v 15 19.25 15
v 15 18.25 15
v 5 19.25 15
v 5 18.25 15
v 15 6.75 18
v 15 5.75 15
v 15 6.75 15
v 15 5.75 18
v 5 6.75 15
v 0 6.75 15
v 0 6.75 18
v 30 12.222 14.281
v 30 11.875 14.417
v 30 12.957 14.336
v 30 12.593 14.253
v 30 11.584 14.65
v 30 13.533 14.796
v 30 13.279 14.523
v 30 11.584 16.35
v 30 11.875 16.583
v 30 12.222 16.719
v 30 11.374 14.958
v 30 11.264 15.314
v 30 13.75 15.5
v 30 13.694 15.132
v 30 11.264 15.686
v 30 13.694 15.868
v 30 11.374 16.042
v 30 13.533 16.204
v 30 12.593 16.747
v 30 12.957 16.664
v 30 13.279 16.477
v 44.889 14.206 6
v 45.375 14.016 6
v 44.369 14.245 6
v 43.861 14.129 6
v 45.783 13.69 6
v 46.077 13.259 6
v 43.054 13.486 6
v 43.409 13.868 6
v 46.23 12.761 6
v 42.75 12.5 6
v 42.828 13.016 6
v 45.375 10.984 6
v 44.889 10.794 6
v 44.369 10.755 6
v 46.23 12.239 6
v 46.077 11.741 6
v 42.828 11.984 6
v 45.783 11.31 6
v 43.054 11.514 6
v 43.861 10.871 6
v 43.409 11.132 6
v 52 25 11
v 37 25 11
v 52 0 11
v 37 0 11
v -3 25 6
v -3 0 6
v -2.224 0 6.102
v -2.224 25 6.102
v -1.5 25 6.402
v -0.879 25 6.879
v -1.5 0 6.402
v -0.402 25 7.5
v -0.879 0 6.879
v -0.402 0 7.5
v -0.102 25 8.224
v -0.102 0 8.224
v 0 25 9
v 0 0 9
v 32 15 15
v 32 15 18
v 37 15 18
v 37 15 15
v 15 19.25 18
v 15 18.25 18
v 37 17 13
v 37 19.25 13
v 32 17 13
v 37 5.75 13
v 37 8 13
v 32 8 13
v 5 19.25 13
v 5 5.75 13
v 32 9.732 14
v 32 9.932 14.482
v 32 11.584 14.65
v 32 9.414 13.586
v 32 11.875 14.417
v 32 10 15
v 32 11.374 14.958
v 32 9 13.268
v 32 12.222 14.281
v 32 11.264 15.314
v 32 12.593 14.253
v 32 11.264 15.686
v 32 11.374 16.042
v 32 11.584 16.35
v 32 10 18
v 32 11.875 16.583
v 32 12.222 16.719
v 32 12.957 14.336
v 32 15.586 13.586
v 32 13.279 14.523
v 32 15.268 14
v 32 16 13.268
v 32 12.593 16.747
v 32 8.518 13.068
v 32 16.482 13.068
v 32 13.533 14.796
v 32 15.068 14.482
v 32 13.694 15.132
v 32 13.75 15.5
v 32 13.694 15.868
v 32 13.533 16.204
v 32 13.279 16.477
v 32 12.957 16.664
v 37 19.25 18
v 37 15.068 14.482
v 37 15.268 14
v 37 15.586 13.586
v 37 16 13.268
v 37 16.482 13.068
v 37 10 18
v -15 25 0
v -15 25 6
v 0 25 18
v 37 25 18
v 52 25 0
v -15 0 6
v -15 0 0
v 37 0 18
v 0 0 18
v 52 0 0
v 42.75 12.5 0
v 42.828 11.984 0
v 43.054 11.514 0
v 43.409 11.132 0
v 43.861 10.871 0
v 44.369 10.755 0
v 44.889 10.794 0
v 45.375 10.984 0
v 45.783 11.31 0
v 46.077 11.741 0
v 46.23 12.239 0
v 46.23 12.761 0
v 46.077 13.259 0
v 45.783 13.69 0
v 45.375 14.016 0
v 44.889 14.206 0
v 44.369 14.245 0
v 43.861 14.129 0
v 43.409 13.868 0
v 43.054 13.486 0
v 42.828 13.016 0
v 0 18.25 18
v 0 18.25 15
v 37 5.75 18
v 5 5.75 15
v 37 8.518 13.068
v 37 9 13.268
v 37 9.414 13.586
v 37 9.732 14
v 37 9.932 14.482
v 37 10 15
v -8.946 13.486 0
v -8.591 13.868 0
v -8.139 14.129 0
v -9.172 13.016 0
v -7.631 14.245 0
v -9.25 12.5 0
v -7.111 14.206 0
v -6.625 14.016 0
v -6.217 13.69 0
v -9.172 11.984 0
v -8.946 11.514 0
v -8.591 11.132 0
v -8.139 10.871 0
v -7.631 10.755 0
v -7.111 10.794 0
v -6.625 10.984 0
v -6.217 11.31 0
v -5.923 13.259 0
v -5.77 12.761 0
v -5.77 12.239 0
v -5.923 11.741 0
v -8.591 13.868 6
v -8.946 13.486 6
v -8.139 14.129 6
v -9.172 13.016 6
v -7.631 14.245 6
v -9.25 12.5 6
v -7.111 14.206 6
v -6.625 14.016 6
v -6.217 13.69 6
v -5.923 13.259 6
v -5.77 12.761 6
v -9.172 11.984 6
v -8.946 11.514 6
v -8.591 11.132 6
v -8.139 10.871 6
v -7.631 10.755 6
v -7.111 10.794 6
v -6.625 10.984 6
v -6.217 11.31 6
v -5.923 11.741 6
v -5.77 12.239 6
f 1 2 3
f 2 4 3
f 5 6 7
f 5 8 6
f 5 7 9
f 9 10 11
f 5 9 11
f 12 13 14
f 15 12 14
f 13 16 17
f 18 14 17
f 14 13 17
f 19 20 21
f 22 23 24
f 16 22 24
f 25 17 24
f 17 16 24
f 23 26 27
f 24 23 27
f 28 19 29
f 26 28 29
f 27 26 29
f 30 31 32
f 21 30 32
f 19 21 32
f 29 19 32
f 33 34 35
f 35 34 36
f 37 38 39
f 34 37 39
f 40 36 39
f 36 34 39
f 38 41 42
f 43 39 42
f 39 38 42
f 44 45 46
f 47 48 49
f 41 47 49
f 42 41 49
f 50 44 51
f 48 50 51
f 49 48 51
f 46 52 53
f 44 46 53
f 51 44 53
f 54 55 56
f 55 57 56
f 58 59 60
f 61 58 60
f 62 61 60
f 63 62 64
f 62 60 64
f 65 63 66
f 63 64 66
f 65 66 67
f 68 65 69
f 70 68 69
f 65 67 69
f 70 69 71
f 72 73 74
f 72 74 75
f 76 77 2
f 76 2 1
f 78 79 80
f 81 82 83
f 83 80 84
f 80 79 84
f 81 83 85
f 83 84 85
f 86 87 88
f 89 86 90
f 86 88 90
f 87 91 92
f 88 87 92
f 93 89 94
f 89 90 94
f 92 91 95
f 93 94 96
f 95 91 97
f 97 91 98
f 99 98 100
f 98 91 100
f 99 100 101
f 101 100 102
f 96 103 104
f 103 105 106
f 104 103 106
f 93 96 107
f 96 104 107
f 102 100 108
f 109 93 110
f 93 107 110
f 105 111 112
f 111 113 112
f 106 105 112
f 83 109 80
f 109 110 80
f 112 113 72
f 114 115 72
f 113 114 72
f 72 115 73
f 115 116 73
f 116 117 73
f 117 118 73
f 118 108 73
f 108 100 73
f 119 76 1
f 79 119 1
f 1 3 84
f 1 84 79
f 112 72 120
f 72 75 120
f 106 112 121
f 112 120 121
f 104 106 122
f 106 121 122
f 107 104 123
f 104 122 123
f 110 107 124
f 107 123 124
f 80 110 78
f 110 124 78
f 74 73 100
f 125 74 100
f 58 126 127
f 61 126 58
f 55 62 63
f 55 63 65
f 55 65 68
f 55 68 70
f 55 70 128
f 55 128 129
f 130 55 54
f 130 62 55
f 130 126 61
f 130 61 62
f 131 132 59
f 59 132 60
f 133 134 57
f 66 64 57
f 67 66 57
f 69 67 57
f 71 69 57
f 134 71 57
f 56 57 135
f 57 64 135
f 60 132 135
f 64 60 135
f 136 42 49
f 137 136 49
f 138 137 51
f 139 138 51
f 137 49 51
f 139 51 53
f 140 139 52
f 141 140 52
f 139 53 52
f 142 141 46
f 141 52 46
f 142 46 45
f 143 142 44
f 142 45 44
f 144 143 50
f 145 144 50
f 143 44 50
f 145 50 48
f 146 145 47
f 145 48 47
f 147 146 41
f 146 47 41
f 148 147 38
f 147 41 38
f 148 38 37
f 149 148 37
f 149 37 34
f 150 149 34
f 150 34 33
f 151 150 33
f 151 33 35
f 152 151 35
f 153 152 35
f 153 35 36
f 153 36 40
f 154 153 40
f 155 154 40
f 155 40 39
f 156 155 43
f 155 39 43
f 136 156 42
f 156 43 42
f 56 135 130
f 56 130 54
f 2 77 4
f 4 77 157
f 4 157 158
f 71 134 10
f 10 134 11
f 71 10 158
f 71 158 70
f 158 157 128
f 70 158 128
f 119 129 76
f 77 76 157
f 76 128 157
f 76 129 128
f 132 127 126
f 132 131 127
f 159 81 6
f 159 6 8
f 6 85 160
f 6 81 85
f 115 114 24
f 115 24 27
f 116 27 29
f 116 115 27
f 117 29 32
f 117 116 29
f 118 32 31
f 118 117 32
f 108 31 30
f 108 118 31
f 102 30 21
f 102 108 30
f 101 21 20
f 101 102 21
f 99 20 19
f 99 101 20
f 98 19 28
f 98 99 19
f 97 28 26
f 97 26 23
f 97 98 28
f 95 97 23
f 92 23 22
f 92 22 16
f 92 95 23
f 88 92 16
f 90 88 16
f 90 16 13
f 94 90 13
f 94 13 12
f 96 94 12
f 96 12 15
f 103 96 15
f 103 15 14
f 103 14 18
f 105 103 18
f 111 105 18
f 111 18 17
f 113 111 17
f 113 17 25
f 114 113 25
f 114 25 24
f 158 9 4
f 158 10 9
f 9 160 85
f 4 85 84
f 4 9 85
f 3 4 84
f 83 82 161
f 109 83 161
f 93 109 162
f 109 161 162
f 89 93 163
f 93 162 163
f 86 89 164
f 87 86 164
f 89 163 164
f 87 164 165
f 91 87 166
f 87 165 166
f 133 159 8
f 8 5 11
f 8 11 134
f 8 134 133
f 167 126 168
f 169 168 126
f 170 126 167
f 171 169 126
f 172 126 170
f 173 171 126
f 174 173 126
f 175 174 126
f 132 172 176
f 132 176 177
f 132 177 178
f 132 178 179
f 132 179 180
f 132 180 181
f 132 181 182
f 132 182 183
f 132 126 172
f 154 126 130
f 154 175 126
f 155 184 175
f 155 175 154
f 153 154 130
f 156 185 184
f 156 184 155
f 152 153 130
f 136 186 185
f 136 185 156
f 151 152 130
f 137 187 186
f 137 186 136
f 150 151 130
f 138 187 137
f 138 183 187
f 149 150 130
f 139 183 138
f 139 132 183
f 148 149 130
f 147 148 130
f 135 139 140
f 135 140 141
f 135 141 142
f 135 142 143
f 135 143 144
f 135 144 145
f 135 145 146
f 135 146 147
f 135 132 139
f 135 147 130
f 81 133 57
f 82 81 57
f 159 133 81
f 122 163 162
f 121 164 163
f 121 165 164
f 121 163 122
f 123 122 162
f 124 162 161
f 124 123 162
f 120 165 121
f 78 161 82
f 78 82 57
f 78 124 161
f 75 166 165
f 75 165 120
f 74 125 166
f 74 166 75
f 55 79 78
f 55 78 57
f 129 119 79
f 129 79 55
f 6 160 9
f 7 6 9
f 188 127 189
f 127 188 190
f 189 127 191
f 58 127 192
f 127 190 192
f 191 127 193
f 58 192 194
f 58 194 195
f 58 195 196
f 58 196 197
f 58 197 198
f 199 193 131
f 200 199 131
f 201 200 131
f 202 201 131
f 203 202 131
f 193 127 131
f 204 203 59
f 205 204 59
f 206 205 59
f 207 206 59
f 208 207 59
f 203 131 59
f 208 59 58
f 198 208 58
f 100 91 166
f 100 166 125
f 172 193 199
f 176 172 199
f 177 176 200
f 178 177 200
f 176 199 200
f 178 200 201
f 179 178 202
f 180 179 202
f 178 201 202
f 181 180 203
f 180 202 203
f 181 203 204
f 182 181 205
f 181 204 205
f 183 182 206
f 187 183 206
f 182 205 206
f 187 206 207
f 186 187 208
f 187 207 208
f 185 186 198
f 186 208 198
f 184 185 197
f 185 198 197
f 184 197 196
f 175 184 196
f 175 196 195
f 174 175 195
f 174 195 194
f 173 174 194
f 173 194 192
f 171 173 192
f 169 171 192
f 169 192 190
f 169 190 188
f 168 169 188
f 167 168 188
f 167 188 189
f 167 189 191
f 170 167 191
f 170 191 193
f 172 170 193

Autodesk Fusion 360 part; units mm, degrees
sketch "Sketch1" plane through (0, 0, 0) normal (1, 0, 0) x (0, 1, 0)
  line L0 (0, 0) -> (25, 0)
  line L1 (25, 0) -> (25, 18)
  line L2 (0, 18) -> (0, 0)
  line L3 (19.25, 15) -> (19.25, 13)
  line L4 (19.25, 13) -> (5.75, 13)
  line L5 (5.75, 13) -> (5.75, 15)
  line L6 (18.25, 18) -> (18.25, 15)
  line L7 (6.75, 15) -> (6.75, 18)
  line L8 (25, 18) -> (18.25, 18)
  line L9 (6.75, 18) -> (0, 18)
  line L10 (5.75, 15) -> (6.75, 15)
  line L11 (18.25, 15) -> (19.25, 15)
  line L12 (6.75, 15) -> (18.25, 15)
  line L13 (5.75, 13) -> (19.25, 13)
  line L14 (19.25, 13) -> (19.25, 18)
  line L15 (19.25, 18) -> (5.75, 18)
  line L16 (5.75, 18) -> (5.75, 13)
  dimension "d1" = 25
  dimension "d2" = 18
  dimension "d3" = 13.5
  dimension "d4" = 2
  dimension "d5" = 13
  dimension "d6" = 5.75
  dimension "d7" = 1
  dimension "d8" = 11.5
  dimension "d9" = 3
  dimension "d10" = 15
  dimension "d32" = 13.5
sketch "Bokorys" plane through (0, 0, 0) normal (0, 1, 0) x (1, 0, 0)
  line L0 (-15, 0) -> (52, 0)
  line L1 (52, 0) -> (52, -6)
  line L2 (-15, -6) -> (-15, 0)
  line L3 (-15, -6) -> (52, -6)
  dimension "d48" = 15
  dimension "d49" = 67
  dimension "d50" = 6
extrude "Extrude1" add sketch "Sketch1" along normal blind 15 contours L0 L1 L2 L3 L4 L5 L8 L9 L13 L14 L16 | L7 L9 L10 L15 L16 | L6 L8 L11 L14 L15 makes body 1
extrude "Extrude2" add sketch "Sketch1" along normal blind 5 contours L3 L4 L5 L10 L11 L12 L13 L14 L16 bodies 1
extrude "Extrude3" add sketch "Sketch1" along normal blind 25 contours L0 L1 L2 L3 L4 L5 L8 L9 L13 L14 L16 bodies 1
extrude "Extrude4" add 1 faces at (25, 10.25, 4.3333) along direction (1, 0, 0) blind 2 on bodies 1 bodies 1
sketch "Sketch4" plane through (27, 0, 0) normal (1, 0, 0) x (0, 1, 0)
  line L0 (0, 18) -> (0, 0)
  line L1 (0, 0) -> (25, 0)
  line L2 (25, 0) -> (25, 18)
  line L3 (25, 18) -> (19.25, 18)
  line L4 (19.25, 18) -> (19.25, 13)
  line L5 (19.25, 13) -> (5.75, 13)
  line L6 (5.75, 13) -> (5.75, 18)
  line L7 (5.75, 18) -> (0, 18)
  line L8 (0, 0) -> (25, 0)
  line L9 (25, 0) -> (25, 18)
  line L10 (25, 18) -> (0, 18)
  line L11 (0, 18) -> (0, 0)
  circle A0 centre (12.5, 15.5) radius 1.25
  line L12 (10, 18) -> (15, 18)
  line L13 (15, 18) -> (15, 13)
  line L14 (15, 13) -> (10, 13)
  line L15 (10, 13) -> (10, 18)
  dimension "d39" = 2.5
  dimension "d40" = 2.5
  dimension "d41" = 25
  dimension "d42" = 12.5
  dimension "d57" = 13
  dimension "d59" = 2.5
  dimension "d60" = 5
  dimension "d61" = 5
extrude "Extrude5" add sketch "Sketch4" along normal blind 5 separate body contours L0 L1 L2 L3 L4 L5 L6 L7 L8 L9 L10 L11 L14 | L5 L6 L10 L15 | L5 L10 L12 L13 L14 L15 | L4 L5 L10 L13 | A0 makes body 2
extrude "Extrude6" add sketch "Sketch4" against normal blind 3 separate body contours A0 makes body 3
extrude "Extrude7" cut 1 faces at (24, 12.8855, 15.0845) along direction (1, 0, 0) blind 1 on bodies 3 bodies 3
extrude "Extrude8" add sketch "Bokorys" along normal blind 25 separate body makes body 4
combine "Combine1" operation add target body 4 tool bodies 2 1
fillet "Fillet1" radius 3 1 edges at (32, 12.5, 6) on bodies 4
fillet "Fillet2" radius 3 1 edges at (0, 12.5, 6) on bodies 4
extrude "Extrude9" add sketch "Sketch4" along normal blind 5 contours L5 L10 L12 L13 L14 L15 | A0 bodies 3
extrude "Extrude10" cut sketch "Sketch4" along normal blind 5 contours L5 L6 L10 L15 | L4 L5 L10 L13 bodies 4
fillet "Fillet3" radius 2 1 edges at (29.5, 10, 13) on bodies 4
fillet "Fillet4" radius 2 1 edges at (29.5, 15, 13) on bodies 4
combine "Combine2" operation add target body 4 tool bodies 3
move_face "OffsetFaces1" offset 5 1 faces at (32, 1.9167, 13.3333) on bodies 4
move_face "OffsetFaces2" offset -5 1 faces at (27, 12.4689, 17.5822) on bodies 4
move_face "OffsetFaces3" offset -5 1 faces at (25, 12.8855, 15.0845) on bodies 4
sketch "Sketch6" plane through (0, 0, 6) normal (0, 0, 1) x (-1, 0, 0)
  line L0 (3, 0) -> (3, -25)
  line L1 (3, -25) -> (15, -25)
  line L2 (15, -25) -> (15, 0)
  line L3 (15, 0) -> (3, 0)
  line L4 (15, -25) -> (-52, -25)
  line L5 (-52, -25) -> (-52, 0)
  line L6 (-52, 0) -> (15, 0)
  line L7 (15, 0) -> (15, -25)
  circle A0 centre (7.5, -12.5) radius 1.75
  line L8 (-18.5, -37) -> (-18.5, 8) construction
  circle A1 centre (-44.5, -12.5) radius 1.75
  dimension "d73" = 3.5
  dimension "d74" = 12.5
  dimension "d75" = 7.5
  dimension "d76" = 33.5
  dimension "d77" = 67
extrude "Extrude13" cut sketch "Sketch6" against normal blind 16 contours A0 | A1 bodies 4
extrude "Extrude11" [suppressed]
extrude "Extrude12" [suppressed]
